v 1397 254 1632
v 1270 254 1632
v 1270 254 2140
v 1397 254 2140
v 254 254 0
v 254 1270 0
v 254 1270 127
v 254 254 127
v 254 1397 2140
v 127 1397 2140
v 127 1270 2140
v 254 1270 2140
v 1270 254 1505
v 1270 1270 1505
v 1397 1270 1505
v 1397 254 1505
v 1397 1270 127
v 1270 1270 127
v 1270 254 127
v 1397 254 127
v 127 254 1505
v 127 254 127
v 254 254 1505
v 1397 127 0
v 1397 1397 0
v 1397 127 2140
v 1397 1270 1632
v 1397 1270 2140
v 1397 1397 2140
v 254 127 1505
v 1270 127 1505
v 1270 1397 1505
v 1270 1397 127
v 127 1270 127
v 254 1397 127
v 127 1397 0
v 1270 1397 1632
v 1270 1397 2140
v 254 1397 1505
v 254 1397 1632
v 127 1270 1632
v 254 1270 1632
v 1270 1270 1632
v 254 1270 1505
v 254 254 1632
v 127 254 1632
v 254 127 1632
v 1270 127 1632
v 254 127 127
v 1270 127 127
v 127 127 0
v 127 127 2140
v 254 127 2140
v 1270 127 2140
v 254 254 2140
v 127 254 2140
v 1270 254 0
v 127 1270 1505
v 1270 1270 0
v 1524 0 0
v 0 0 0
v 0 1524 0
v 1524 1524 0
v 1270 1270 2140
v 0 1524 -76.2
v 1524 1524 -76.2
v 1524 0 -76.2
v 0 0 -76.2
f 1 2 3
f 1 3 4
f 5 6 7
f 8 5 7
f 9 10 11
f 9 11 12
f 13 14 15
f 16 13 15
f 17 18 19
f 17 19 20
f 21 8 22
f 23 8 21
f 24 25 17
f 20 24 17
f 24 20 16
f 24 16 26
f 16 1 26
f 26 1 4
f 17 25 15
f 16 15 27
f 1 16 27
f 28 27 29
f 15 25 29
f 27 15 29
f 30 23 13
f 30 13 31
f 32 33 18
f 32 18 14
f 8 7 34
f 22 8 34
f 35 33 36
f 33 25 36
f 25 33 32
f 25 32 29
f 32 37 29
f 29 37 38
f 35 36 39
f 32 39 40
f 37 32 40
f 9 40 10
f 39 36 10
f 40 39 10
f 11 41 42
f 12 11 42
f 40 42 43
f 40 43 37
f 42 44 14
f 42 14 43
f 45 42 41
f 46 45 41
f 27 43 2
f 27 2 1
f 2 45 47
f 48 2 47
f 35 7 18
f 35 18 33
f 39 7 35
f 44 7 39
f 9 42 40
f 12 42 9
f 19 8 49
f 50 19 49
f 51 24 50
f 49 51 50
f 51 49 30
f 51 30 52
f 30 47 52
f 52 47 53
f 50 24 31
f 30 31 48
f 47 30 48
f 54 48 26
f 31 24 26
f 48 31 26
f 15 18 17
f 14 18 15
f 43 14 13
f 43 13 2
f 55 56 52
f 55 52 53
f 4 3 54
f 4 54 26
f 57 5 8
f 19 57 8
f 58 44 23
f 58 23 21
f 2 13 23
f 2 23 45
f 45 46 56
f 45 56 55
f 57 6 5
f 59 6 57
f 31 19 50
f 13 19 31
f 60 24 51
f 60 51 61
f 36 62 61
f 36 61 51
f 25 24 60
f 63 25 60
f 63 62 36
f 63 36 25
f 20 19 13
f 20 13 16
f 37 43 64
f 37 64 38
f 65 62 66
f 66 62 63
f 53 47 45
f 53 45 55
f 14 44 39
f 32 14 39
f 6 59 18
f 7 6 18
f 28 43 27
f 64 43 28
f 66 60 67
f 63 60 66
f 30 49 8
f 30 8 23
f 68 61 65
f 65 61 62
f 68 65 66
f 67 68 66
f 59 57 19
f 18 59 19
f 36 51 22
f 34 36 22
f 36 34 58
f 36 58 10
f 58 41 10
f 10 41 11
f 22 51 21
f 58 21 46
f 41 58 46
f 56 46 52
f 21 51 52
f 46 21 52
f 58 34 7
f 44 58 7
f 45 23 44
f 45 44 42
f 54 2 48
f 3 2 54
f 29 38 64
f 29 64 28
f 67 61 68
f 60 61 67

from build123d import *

# Parameters (mm, degrees)
F0_W      = 127
F0_H      = 127
F1_DEPTH  = 2140
F0_W_2    = 1524
F0_H_2    = 1524
F2_DEPTH  = 76.2
F6_W      = 127
F6_H      = 127
F7_DEPTH  = 1080
F5_W      = 127
F5_H      = 127
F8_DEPTH  = 1080
F4_W      = 127
F4_H      = 127
F9_DEPTH  = 1090
F3_W      = 127
F3_H      = 127
F10_DEPTH = 1070
F11_W     = 127
F11_H     = 127
F15_DEPTH = 1060
F12_W     = 127
F12_H     = 127
F16_DEPTH = 1090
F13_W     = 127
F13_H     = 127
F17_DEPTH = 1070
F14_W     = 127
F14_H     = 127
F18_DEPTH = 1100


with BuildPart() as f1:
    # F0 (on Top) → F1 (new body)
    with BuildSketch(Plane.XY):
        with Locations((190.5, 1333.5)):
            Rectangle(F0_W, F0_H)
    extrude(amount=F1_DEPTH)



with BuildPart() as f1b:
    # F0 (on Top) → F1, piece 2 (new body)
    with BuildSketch(Plane.XY):
        with Locations((1333.5, 1333.5)):
            Rectangle(F0_W, F0_H)
    extrude(amount=F1_DEPTH)


with BuildPart() as f1c:
    # F0 (on Top) → F1, piece 3 (new body)
    with BuildSketch(Plane.XY):
        with Locations((1333.5, 190.5)):
            Rectangle(F0_W, F0_H)
    extrude(amount=F1_DEPTH)


with BuildPart() as f1d:
    # F0 (on Top) → F1, piece 4 (new body)
    with BuildSketch(Plane.XY):
        with Locations((190.5, 190.5)):
            Rectangle(F0_W, F0_H)
    extrude(amount=F1_DEPTH)


with BuildPart() as f1_1:
    add(f1.part)

    add(f1b.part)  # F2 merges F1b

    add(f1c.part)  # F2 merges F1c

    add(f1d.part)  # F2 merges F1d
    # F0 (on Top) → F2 (join)
    with BuildSketch(Plane.XY):
        with Locations((762, 762)):
            Rectangle(F0_W_2, F0_H_2)
        with Locations((190.5, 190.5)):
            Rectangle(F0_W, F0_H, mode=Mode.SUBTRACT)
        with Locations((1333.5, 190.5)):
            Rectangle(F0_W, F0_H, mode=Mode.SUBTRACT)
        with Locations((190.5, 1333.5)):
            Rectangle(F0_W, F0_H, mode=Mode.SUBTRACT)
        with Locations((1333.5, 1333.5)):
            Rectangle(F0_W, F0_H, mode=Mode.SUBTRACT)
        with Locations((190.5, 1333.5)):
            Rectangle(F0_W, F0_H)
        with Locations((1333.5, 1333.5)):
            Rectangle(F0_W, F0_H)
        with Locations((1333.5, 190.5)):
            Rectangle(F0_W, F0_H)
        with Locations((190.5, 190.5)):
            Rectangle(F0_W, F0_H)
    extrude(amount=-F2_DEPTH)

    # F6 (on face) → F7 (join)
    with BuildSketch(Plane(origin=(0, 254, 0), x_dir=(-1, 0, 0), z_dir=(0, 1, 0))):
        with Locations((-190.5, 1568.5)):
            Rectangle(F6_W, F6_H)
    extrude(amount=F7_DEPTH)

    # F5 (on face) → F8 (join)
    with BuildSketch(Plane.YZ.offset(254)):
        with Locations((1333.5, 1568.5)):
            Rectangle(F5_W, F5_H)
    extrude(amount=F8_DEPTH)

    # F4 (on face) → F9 (join)
    with BuildSketch(Plane.XZ.offset(-1270)):
        with Locations((1333.5, 1568.5)):
            Rectangle(F4_W, F4_H)
    extrude(amount=F9_DEPTH)

    # F3 (on face) → F10 (join)
    with BuildSketch(Plane(origin=(1270, 0, 0), x_dir=(0, -1, 0), z_dir=(-1, 0, 0))):
        with Locations((-190.5, 1568.5)):
            Rectangle(F3_W, F3_H)
    extrude(amount=F10_DEPTH)

    # F11 (on face) → F15 (join)
    with BuildSketch(Plane.XZ.offset(-1270)):
        with Locations((1333.5, 63.5)):
            Rectangle(F11_W, F11_H)
    extrude(amount=F15_DEPTH)

    # F12 (on face) → F16 (join)
    with BuildSketch(Plane(origin=(1270, 0, 0), x_dir=(0, -1, 0), z_dir=(-1, 0, 0))):
        with Locations((-190.5, 63.5)):
            Rectangle(F12_W, F12_H)
    extrude(amount=F16_DEPTH)

    # F13 (on face) → F17 (join)
    with BuildSketch(Plane(origin=(0, 254, 0), x_dir=(-1, 0, 0), z_dir=(0, 1, 0))):
        with Locations((-190.5, 63.5)):
            Rectangle(F13_W, F13_H)
    extrude(amount=F17_DEPTH)

    # F14 (on face) → F18 (join)
    with BuildSketch(Plane.YZ.offset(254)):
        with Locations((1333.5, 63.5)):
            Rectangle(F14_W, F14_H)
    extrude(amount=F18_DEPTH)


solid = f1_1.part
